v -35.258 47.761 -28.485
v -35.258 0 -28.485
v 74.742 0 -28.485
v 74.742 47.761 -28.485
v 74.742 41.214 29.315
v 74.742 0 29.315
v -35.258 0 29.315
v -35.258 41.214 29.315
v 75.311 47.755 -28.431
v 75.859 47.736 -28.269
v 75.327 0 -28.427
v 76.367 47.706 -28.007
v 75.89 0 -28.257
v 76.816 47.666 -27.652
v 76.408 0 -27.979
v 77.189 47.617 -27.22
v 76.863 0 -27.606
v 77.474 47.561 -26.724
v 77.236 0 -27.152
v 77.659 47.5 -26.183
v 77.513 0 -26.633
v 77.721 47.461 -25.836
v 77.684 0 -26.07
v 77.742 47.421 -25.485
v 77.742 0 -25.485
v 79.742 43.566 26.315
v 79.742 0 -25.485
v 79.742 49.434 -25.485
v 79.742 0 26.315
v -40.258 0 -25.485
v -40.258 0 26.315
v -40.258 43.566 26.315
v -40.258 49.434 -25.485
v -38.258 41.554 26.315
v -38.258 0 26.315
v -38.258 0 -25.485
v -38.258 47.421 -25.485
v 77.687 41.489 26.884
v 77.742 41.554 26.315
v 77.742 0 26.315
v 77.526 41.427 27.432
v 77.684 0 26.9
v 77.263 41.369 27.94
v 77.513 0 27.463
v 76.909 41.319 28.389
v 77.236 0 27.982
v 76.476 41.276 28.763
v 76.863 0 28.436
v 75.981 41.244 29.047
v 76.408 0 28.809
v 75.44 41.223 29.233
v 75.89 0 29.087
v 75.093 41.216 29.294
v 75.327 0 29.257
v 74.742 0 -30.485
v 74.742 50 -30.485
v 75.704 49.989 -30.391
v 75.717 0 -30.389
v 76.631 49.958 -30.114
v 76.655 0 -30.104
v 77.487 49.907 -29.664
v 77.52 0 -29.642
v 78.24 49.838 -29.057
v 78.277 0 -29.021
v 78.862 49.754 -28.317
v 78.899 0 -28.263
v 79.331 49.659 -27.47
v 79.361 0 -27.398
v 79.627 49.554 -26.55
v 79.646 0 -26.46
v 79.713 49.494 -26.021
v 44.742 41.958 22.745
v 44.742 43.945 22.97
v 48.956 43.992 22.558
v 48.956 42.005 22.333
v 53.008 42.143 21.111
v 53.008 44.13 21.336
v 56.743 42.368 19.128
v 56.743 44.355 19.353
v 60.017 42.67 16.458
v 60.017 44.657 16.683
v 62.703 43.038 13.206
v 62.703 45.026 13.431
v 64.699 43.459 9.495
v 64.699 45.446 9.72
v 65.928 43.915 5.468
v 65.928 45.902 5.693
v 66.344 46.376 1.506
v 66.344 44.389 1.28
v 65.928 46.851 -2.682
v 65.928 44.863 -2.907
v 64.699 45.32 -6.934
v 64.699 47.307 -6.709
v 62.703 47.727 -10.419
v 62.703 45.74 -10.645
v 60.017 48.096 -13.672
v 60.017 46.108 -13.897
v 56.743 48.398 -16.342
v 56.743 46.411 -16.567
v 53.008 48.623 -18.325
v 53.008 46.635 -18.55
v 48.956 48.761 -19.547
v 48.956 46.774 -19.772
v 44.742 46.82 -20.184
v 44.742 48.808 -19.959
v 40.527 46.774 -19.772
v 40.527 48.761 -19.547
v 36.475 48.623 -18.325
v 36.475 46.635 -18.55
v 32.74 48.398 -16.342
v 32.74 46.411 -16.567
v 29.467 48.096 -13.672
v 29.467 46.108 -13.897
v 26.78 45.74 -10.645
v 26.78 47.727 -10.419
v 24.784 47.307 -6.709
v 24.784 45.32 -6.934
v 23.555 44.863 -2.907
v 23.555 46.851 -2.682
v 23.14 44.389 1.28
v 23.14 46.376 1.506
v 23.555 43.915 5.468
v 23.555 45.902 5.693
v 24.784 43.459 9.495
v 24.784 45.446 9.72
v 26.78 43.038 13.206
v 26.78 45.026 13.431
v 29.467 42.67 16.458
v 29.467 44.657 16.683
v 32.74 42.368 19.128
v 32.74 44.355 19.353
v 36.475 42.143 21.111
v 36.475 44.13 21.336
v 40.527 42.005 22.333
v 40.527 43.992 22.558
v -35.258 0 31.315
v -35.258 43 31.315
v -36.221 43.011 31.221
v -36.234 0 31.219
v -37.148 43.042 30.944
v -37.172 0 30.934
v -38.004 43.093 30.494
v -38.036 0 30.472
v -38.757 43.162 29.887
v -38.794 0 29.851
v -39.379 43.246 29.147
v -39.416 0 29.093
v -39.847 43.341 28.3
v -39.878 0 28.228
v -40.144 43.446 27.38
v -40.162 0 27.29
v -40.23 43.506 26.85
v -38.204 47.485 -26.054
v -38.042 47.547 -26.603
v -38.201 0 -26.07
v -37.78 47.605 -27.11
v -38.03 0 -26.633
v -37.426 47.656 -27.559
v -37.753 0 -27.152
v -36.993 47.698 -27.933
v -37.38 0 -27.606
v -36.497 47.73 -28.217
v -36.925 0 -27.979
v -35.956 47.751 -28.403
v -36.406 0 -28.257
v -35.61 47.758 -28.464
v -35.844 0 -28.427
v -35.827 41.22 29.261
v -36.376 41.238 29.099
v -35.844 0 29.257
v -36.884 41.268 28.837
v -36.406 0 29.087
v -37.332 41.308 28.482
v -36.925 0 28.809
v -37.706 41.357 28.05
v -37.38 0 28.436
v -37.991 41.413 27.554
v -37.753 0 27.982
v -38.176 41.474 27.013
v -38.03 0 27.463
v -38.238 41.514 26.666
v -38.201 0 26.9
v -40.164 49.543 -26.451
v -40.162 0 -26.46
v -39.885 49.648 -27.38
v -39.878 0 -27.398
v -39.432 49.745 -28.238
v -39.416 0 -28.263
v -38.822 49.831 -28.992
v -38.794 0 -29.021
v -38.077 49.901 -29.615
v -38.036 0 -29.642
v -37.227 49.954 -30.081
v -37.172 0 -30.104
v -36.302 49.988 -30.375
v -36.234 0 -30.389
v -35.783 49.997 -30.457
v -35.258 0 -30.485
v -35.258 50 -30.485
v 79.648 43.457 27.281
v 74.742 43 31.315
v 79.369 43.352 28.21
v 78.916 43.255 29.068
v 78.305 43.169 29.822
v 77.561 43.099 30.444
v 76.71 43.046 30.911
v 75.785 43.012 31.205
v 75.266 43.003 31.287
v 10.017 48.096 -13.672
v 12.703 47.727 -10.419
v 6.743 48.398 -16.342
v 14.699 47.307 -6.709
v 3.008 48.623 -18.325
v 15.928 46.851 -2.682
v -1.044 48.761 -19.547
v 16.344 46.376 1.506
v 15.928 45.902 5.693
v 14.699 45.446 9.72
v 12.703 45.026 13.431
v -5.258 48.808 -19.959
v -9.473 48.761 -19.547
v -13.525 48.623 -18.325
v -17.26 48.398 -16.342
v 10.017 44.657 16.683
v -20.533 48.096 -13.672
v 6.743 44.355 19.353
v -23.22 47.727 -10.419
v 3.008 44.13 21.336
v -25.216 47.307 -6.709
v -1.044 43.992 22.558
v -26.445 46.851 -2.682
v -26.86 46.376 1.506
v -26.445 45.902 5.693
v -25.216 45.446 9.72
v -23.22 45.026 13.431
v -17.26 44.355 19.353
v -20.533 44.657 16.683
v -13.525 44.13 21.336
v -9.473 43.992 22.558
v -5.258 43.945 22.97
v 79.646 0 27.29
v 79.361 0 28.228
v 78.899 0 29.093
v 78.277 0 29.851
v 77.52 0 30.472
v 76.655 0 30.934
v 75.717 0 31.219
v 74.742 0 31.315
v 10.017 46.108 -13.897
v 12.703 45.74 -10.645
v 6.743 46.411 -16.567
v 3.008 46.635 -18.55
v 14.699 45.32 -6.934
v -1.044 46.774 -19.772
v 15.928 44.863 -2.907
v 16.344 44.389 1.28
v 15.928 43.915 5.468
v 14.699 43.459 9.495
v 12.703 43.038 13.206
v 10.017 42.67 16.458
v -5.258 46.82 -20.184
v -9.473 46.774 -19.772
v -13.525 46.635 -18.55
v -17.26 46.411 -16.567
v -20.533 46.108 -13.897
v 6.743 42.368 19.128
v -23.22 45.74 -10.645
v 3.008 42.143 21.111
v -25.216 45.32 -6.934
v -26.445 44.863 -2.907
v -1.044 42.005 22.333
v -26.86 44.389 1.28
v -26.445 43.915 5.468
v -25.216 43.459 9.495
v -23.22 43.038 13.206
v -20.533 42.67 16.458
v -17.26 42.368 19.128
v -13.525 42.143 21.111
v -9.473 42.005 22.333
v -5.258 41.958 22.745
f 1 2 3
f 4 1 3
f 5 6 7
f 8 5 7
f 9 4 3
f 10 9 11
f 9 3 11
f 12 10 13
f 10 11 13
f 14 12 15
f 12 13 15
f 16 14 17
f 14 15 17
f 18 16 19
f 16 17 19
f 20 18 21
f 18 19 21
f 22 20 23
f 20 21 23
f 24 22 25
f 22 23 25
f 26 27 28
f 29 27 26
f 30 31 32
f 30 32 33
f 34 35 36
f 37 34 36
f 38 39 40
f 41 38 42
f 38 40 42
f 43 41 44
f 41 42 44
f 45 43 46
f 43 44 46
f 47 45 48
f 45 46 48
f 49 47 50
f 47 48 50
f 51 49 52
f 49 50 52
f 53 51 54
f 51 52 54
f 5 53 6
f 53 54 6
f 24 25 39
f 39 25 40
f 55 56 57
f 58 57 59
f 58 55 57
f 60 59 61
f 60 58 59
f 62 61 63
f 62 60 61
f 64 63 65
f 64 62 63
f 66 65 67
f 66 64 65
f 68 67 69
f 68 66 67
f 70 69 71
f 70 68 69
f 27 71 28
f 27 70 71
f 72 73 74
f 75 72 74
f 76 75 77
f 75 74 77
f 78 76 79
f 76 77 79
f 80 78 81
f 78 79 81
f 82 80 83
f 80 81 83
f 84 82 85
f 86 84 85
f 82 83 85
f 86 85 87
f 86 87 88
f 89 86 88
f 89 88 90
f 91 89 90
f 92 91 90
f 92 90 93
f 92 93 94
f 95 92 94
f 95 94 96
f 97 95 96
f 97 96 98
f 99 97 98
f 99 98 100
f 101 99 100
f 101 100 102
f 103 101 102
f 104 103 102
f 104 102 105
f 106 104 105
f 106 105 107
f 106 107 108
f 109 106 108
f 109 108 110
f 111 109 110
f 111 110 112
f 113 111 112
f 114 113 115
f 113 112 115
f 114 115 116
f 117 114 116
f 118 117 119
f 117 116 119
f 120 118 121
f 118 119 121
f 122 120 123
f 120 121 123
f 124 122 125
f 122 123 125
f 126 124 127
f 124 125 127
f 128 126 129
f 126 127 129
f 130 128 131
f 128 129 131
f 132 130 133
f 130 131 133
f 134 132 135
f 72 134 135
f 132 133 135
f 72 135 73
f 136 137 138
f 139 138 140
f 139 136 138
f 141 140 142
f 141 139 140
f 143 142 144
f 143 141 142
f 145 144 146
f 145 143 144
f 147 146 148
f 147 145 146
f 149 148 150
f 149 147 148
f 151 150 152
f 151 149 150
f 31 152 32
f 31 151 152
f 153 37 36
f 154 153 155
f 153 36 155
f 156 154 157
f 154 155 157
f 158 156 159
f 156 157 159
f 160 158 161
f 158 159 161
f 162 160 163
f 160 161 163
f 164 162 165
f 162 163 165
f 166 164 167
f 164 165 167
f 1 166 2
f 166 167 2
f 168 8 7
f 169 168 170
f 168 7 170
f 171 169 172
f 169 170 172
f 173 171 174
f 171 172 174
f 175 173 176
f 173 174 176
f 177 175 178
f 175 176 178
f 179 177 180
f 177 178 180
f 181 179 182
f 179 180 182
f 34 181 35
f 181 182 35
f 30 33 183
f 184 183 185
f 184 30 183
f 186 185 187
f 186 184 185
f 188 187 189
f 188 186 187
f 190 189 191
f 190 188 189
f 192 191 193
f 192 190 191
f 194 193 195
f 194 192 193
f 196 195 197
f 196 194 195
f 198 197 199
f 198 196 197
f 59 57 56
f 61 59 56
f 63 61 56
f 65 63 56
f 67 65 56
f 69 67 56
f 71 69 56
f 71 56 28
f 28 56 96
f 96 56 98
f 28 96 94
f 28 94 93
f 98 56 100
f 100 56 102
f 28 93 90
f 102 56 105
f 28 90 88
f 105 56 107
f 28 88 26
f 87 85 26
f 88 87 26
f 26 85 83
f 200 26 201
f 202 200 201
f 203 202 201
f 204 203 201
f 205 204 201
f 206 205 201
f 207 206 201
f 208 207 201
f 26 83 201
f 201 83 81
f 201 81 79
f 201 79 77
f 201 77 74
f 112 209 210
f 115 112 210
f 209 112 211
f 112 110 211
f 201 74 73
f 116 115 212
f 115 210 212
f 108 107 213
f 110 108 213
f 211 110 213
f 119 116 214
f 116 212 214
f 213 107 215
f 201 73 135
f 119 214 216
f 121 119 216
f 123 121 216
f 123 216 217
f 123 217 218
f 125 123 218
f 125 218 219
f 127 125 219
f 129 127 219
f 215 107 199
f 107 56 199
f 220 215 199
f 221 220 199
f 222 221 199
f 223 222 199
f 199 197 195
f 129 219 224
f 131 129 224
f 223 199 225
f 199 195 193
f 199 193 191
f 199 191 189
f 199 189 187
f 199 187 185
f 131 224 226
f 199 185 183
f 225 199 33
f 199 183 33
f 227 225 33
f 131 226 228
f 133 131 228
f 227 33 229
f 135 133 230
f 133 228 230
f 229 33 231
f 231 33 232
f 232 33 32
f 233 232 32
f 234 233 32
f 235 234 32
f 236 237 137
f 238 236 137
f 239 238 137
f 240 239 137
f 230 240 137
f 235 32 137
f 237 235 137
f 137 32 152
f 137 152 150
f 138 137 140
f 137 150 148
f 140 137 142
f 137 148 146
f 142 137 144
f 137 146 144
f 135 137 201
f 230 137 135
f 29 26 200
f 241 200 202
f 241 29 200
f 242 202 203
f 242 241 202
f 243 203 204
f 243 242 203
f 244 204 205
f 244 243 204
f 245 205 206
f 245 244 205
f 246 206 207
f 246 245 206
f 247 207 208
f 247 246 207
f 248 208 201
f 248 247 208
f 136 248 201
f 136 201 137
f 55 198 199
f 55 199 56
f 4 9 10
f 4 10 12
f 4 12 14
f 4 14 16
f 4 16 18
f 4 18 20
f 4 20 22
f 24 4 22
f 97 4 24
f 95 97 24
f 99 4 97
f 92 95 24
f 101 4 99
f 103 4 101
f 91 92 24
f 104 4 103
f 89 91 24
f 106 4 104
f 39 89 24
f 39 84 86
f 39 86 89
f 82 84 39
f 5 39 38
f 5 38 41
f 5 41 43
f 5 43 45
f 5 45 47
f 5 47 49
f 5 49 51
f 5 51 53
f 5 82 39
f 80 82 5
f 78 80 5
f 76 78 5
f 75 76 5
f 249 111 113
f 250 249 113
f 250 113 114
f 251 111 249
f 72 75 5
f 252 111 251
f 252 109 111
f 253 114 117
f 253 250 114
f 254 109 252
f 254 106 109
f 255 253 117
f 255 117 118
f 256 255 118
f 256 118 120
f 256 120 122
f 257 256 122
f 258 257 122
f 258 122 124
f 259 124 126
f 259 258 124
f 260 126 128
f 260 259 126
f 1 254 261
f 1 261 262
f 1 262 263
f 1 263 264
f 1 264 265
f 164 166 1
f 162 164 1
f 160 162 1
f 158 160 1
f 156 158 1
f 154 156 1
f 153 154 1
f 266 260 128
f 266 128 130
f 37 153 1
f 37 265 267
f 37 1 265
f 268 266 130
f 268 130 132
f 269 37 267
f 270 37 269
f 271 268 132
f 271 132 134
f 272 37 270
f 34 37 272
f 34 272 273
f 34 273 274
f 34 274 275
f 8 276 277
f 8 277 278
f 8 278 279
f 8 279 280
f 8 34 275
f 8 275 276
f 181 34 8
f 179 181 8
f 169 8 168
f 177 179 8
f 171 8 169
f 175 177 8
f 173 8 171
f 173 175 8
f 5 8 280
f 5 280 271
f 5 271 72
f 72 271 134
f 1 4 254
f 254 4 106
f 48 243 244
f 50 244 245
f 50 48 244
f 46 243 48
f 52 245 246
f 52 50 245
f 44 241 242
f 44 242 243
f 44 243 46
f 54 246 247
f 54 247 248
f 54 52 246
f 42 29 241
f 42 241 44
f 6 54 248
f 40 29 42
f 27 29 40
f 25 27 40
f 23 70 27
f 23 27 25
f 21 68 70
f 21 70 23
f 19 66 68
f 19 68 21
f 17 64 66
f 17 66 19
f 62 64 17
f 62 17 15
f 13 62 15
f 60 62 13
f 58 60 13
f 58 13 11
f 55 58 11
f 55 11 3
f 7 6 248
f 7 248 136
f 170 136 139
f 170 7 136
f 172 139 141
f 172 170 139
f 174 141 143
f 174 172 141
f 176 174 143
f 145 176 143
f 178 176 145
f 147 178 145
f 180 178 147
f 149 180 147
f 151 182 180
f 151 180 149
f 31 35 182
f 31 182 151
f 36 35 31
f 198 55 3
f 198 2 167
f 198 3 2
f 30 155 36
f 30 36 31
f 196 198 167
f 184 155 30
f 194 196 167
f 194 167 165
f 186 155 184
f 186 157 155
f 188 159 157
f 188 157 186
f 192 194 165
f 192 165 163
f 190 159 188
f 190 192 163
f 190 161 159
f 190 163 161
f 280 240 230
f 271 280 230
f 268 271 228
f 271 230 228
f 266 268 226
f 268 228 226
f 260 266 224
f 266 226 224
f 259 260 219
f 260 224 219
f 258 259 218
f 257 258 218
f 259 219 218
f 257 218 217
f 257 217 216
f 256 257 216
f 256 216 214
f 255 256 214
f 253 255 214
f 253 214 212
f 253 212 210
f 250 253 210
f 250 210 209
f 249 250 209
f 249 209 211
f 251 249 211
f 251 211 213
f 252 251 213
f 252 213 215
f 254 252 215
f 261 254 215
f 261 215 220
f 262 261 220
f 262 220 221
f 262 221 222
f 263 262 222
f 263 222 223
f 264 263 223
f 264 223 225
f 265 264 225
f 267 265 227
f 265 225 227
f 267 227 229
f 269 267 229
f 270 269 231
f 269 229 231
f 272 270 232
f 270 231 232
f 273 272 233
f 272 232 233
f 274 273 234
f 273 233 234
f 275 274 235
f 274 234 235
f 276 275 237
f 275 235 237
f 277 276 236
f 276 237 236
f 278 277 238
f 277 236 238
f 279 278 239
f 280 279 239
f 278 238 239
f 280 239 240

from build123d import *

# Parameters (mm, degrees)
EXTRUDE_6_DEPTH          = 50
CUT_EXTRUDE_1_DEPTH      = 134.718463472
CUT_EXTRUDE_1_DEPTH_BACK = 134.718463472
SKETCH_5_R               = 21.601831088
CUT_EXTRUDE_2_DEPTH      = 99.714931123
SHELL_3_T                = -2


with BuildPart() as part:
    # 草图3 → 凸台-拉伸6 (new body)
    with BuildSketch(Plane(origin=(0, 0, 0), x_dir=(1, 0, 0), z_dir=(0, 1, 0))):
        with BuildLine():
            Line((-35.258285714, 30.485027968), (74.741714286, 30.485027968))
            ThreePointArc((74.741714286, 30.485027968), (78.277248192, 29.020561874), (79.741714286, 25.485027968))
            Line((79.741714286, 25.485027968), (79.741714286, -26.314972032))
            ThreePointArc((79.741714286, -26.314972032), (78.277248192, -29.850505938), (74.741714286, -31.314972032))
            Line((74.741714286, -31.314972032), (-35.258285714, -31.314972032))
            ThreePointArc((-35.258285714, -31.314972032), (-38.79381962, -29.850505938), (-40.258285714, -26.314972032))
            Line((-40.258285714, -26.314972032), (-40.258285714, 25.485027968))
            ThreePointArc((-40.258285714, 25.485027968), (-38.79381962, 29.020561874), (-35.258285714, 30.485027968))
        make_face()
    extrude(amount=EXTRUDE_6_DEPTH)

    # 草图4 → 切除-拉伸1 (cut, two sides: drawn at the far end of the back side and taken through both)
    with BuildSketch(Plane(origin=(79.741714286, 0, 0), x_dir=(0, 0, -1), z_dir=(1, 0, 0)).offset(-CUT_EXTRUDE_1_DEPTH_BACK)):
        Polygon((30.485027968, 50), (-31.314972032, 43), (-31.314972032, 50), align=None)
    extrude(amount=CUT_EXTRUDE_1_DEPTH + CUT_EXTRUDE_1_DEPTH_BACK, mode=Mode.SUBTRACT)

    # 草图5 → 切除-拉伸2 (cut, through all)
    with BuildSketch(Plane(origin=(0, 45.957380333, 5.205528517), x_dir=(1, 0, 0), z_dir=(0, 0.9936461847514532, 0.11254892060291542))):
        with Locations(Location((44.741714286, 3.723601101, 0), (0, 0, 270))):
            Circle(SKETCH_5_R)
        with Locations(Location((-5.258285714, 3.723601101, 0), (0, 0, 270))):
            Circle(SKETCH_5_R)
    extrude(amount=-CUT_EXTRUDE_2_DEPTH, mode=Mode.SUBTRACT)

    # 抽壳3
    shell_3_openings = [part.faces().sort_by_distance(p)[0] for p in [
        (-5.258285714, 24.353508562, -22.728886231),
        (44.741714286, 24.353508562, -22.728886231),
        (19.741714286, 0, 3.178829845),
    ]]
    offset(amount=SHELL_3_T, openings=shell_3_openings, kind=Kind.INTERSECTION)


solid = part.part
